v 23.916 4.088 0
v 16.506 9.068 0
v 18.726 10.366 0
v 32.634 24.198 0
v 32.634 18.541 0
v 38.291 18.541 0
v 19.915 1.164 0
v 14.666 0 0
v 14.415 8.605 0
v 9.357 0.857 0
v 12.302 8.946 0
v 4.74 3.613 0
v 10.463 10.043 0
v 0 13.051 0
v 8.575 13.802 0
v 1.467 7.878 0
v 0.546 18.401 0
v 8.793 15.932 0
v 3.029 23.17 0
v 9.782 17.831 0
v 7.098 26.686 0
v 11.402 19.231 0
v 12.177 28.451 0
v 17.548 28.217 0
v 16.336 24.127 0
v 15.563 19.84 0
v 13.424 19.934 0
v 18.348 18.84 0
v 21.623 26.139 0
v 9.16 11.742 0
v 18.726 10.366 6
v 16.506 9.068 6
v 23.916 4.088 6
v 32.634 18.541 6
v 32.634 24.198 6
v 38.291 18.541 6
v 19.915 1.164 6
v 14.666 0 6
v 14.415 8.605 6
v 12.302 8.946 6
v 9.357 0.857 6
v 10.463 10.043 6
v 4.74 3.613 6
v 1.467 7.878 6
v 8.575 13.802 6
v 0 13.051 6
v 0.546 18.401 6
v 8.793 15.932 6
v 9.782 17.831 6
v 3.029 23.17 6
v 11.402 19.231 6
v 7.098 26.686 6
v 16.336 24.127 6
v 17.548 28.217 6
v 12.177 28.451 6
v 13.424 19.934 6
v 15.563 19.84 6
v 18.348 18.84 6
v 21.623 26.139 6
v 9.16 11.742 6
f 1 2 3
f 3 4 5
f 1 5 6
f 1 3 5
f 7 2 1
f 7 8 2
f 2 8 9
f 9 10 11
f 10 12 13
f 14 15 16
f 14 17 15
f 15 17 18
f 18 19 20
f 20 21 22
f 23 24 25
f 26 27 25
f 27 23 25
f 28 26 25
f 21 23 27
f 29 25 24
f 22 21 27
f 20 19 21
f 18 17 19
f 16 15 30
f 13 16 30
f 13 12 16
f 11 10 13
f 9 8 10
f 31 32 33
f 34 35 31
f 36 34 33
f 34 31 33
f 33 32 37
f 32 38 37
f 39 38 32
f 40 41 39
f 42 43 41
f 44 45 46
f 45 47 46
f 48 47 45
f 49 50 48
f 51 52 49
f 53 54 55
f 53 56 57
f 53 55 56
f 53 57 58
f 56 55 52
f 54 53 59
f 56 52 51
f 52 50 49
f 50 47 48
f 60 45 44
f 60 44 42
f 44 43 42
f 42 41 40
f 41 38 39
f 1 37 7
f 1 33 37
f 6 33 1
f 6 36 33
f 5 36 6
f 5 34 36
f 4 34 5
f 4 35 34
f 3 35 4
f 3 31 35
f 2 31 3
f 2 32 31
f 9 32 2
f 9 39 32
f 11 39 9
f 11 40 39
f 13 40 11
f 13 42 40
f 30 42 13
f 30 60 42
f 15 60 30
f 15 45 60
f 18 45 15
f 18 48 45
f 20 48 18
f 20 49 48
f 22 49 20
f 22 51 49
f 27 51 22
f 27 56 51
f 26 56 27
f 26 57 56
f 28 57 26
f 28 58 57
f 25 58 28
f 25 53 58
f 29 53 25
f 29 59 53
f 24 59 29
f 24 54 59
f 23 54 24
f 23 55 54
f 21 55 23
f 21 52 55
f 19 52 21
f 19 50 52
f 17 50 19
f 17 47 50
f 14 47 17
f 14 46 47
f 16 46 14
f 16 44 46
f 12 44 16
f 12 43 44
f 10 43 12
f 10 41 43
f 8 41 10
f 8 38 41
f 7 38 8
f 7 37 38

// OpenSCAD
$fn = 32;

// ----------------------------------------------------------------------
// Eye lug: ring_tail, 6 mm thick
// ----------------------------------------------------------------------

// --- parameters (mm) ---
profile_height = 6;       // extrusion height
profile_points = 30;      // points of the closed outline

profile = [[16.336, 24.127], [21.623, 26.139], [17.548, 28.217], [12.177, 28.451], [7.098, 26.686], [3.029, 23.17], [0.546, 18.401], [0, 13.051], [1.467, 7.878], [4.74, 3.613], [9.357, 0.857], [14.666, 0], [19.915, 1.164], [23.916, 4.088], [38.291, 18.541], [32.634, 18.541], [32.634, 24.198], [18.726, 10.366], [16.506, 9.068], [14.415, 8.605], [12.302, 8.946], [10.463, 10.043], [9.16, 11.742], [8.575, 13.802], [8.793, 15.932], [9.782, 17.831], [11.402, 19.231], [13.424, 19.934], [15.563, 19.84], [18.348, 18.84]];  // single closed polygon, 30 points, counter clockwise

// --- the one profile operation ---
linear_extrude(height = profile_height) polygon(points = profile);
